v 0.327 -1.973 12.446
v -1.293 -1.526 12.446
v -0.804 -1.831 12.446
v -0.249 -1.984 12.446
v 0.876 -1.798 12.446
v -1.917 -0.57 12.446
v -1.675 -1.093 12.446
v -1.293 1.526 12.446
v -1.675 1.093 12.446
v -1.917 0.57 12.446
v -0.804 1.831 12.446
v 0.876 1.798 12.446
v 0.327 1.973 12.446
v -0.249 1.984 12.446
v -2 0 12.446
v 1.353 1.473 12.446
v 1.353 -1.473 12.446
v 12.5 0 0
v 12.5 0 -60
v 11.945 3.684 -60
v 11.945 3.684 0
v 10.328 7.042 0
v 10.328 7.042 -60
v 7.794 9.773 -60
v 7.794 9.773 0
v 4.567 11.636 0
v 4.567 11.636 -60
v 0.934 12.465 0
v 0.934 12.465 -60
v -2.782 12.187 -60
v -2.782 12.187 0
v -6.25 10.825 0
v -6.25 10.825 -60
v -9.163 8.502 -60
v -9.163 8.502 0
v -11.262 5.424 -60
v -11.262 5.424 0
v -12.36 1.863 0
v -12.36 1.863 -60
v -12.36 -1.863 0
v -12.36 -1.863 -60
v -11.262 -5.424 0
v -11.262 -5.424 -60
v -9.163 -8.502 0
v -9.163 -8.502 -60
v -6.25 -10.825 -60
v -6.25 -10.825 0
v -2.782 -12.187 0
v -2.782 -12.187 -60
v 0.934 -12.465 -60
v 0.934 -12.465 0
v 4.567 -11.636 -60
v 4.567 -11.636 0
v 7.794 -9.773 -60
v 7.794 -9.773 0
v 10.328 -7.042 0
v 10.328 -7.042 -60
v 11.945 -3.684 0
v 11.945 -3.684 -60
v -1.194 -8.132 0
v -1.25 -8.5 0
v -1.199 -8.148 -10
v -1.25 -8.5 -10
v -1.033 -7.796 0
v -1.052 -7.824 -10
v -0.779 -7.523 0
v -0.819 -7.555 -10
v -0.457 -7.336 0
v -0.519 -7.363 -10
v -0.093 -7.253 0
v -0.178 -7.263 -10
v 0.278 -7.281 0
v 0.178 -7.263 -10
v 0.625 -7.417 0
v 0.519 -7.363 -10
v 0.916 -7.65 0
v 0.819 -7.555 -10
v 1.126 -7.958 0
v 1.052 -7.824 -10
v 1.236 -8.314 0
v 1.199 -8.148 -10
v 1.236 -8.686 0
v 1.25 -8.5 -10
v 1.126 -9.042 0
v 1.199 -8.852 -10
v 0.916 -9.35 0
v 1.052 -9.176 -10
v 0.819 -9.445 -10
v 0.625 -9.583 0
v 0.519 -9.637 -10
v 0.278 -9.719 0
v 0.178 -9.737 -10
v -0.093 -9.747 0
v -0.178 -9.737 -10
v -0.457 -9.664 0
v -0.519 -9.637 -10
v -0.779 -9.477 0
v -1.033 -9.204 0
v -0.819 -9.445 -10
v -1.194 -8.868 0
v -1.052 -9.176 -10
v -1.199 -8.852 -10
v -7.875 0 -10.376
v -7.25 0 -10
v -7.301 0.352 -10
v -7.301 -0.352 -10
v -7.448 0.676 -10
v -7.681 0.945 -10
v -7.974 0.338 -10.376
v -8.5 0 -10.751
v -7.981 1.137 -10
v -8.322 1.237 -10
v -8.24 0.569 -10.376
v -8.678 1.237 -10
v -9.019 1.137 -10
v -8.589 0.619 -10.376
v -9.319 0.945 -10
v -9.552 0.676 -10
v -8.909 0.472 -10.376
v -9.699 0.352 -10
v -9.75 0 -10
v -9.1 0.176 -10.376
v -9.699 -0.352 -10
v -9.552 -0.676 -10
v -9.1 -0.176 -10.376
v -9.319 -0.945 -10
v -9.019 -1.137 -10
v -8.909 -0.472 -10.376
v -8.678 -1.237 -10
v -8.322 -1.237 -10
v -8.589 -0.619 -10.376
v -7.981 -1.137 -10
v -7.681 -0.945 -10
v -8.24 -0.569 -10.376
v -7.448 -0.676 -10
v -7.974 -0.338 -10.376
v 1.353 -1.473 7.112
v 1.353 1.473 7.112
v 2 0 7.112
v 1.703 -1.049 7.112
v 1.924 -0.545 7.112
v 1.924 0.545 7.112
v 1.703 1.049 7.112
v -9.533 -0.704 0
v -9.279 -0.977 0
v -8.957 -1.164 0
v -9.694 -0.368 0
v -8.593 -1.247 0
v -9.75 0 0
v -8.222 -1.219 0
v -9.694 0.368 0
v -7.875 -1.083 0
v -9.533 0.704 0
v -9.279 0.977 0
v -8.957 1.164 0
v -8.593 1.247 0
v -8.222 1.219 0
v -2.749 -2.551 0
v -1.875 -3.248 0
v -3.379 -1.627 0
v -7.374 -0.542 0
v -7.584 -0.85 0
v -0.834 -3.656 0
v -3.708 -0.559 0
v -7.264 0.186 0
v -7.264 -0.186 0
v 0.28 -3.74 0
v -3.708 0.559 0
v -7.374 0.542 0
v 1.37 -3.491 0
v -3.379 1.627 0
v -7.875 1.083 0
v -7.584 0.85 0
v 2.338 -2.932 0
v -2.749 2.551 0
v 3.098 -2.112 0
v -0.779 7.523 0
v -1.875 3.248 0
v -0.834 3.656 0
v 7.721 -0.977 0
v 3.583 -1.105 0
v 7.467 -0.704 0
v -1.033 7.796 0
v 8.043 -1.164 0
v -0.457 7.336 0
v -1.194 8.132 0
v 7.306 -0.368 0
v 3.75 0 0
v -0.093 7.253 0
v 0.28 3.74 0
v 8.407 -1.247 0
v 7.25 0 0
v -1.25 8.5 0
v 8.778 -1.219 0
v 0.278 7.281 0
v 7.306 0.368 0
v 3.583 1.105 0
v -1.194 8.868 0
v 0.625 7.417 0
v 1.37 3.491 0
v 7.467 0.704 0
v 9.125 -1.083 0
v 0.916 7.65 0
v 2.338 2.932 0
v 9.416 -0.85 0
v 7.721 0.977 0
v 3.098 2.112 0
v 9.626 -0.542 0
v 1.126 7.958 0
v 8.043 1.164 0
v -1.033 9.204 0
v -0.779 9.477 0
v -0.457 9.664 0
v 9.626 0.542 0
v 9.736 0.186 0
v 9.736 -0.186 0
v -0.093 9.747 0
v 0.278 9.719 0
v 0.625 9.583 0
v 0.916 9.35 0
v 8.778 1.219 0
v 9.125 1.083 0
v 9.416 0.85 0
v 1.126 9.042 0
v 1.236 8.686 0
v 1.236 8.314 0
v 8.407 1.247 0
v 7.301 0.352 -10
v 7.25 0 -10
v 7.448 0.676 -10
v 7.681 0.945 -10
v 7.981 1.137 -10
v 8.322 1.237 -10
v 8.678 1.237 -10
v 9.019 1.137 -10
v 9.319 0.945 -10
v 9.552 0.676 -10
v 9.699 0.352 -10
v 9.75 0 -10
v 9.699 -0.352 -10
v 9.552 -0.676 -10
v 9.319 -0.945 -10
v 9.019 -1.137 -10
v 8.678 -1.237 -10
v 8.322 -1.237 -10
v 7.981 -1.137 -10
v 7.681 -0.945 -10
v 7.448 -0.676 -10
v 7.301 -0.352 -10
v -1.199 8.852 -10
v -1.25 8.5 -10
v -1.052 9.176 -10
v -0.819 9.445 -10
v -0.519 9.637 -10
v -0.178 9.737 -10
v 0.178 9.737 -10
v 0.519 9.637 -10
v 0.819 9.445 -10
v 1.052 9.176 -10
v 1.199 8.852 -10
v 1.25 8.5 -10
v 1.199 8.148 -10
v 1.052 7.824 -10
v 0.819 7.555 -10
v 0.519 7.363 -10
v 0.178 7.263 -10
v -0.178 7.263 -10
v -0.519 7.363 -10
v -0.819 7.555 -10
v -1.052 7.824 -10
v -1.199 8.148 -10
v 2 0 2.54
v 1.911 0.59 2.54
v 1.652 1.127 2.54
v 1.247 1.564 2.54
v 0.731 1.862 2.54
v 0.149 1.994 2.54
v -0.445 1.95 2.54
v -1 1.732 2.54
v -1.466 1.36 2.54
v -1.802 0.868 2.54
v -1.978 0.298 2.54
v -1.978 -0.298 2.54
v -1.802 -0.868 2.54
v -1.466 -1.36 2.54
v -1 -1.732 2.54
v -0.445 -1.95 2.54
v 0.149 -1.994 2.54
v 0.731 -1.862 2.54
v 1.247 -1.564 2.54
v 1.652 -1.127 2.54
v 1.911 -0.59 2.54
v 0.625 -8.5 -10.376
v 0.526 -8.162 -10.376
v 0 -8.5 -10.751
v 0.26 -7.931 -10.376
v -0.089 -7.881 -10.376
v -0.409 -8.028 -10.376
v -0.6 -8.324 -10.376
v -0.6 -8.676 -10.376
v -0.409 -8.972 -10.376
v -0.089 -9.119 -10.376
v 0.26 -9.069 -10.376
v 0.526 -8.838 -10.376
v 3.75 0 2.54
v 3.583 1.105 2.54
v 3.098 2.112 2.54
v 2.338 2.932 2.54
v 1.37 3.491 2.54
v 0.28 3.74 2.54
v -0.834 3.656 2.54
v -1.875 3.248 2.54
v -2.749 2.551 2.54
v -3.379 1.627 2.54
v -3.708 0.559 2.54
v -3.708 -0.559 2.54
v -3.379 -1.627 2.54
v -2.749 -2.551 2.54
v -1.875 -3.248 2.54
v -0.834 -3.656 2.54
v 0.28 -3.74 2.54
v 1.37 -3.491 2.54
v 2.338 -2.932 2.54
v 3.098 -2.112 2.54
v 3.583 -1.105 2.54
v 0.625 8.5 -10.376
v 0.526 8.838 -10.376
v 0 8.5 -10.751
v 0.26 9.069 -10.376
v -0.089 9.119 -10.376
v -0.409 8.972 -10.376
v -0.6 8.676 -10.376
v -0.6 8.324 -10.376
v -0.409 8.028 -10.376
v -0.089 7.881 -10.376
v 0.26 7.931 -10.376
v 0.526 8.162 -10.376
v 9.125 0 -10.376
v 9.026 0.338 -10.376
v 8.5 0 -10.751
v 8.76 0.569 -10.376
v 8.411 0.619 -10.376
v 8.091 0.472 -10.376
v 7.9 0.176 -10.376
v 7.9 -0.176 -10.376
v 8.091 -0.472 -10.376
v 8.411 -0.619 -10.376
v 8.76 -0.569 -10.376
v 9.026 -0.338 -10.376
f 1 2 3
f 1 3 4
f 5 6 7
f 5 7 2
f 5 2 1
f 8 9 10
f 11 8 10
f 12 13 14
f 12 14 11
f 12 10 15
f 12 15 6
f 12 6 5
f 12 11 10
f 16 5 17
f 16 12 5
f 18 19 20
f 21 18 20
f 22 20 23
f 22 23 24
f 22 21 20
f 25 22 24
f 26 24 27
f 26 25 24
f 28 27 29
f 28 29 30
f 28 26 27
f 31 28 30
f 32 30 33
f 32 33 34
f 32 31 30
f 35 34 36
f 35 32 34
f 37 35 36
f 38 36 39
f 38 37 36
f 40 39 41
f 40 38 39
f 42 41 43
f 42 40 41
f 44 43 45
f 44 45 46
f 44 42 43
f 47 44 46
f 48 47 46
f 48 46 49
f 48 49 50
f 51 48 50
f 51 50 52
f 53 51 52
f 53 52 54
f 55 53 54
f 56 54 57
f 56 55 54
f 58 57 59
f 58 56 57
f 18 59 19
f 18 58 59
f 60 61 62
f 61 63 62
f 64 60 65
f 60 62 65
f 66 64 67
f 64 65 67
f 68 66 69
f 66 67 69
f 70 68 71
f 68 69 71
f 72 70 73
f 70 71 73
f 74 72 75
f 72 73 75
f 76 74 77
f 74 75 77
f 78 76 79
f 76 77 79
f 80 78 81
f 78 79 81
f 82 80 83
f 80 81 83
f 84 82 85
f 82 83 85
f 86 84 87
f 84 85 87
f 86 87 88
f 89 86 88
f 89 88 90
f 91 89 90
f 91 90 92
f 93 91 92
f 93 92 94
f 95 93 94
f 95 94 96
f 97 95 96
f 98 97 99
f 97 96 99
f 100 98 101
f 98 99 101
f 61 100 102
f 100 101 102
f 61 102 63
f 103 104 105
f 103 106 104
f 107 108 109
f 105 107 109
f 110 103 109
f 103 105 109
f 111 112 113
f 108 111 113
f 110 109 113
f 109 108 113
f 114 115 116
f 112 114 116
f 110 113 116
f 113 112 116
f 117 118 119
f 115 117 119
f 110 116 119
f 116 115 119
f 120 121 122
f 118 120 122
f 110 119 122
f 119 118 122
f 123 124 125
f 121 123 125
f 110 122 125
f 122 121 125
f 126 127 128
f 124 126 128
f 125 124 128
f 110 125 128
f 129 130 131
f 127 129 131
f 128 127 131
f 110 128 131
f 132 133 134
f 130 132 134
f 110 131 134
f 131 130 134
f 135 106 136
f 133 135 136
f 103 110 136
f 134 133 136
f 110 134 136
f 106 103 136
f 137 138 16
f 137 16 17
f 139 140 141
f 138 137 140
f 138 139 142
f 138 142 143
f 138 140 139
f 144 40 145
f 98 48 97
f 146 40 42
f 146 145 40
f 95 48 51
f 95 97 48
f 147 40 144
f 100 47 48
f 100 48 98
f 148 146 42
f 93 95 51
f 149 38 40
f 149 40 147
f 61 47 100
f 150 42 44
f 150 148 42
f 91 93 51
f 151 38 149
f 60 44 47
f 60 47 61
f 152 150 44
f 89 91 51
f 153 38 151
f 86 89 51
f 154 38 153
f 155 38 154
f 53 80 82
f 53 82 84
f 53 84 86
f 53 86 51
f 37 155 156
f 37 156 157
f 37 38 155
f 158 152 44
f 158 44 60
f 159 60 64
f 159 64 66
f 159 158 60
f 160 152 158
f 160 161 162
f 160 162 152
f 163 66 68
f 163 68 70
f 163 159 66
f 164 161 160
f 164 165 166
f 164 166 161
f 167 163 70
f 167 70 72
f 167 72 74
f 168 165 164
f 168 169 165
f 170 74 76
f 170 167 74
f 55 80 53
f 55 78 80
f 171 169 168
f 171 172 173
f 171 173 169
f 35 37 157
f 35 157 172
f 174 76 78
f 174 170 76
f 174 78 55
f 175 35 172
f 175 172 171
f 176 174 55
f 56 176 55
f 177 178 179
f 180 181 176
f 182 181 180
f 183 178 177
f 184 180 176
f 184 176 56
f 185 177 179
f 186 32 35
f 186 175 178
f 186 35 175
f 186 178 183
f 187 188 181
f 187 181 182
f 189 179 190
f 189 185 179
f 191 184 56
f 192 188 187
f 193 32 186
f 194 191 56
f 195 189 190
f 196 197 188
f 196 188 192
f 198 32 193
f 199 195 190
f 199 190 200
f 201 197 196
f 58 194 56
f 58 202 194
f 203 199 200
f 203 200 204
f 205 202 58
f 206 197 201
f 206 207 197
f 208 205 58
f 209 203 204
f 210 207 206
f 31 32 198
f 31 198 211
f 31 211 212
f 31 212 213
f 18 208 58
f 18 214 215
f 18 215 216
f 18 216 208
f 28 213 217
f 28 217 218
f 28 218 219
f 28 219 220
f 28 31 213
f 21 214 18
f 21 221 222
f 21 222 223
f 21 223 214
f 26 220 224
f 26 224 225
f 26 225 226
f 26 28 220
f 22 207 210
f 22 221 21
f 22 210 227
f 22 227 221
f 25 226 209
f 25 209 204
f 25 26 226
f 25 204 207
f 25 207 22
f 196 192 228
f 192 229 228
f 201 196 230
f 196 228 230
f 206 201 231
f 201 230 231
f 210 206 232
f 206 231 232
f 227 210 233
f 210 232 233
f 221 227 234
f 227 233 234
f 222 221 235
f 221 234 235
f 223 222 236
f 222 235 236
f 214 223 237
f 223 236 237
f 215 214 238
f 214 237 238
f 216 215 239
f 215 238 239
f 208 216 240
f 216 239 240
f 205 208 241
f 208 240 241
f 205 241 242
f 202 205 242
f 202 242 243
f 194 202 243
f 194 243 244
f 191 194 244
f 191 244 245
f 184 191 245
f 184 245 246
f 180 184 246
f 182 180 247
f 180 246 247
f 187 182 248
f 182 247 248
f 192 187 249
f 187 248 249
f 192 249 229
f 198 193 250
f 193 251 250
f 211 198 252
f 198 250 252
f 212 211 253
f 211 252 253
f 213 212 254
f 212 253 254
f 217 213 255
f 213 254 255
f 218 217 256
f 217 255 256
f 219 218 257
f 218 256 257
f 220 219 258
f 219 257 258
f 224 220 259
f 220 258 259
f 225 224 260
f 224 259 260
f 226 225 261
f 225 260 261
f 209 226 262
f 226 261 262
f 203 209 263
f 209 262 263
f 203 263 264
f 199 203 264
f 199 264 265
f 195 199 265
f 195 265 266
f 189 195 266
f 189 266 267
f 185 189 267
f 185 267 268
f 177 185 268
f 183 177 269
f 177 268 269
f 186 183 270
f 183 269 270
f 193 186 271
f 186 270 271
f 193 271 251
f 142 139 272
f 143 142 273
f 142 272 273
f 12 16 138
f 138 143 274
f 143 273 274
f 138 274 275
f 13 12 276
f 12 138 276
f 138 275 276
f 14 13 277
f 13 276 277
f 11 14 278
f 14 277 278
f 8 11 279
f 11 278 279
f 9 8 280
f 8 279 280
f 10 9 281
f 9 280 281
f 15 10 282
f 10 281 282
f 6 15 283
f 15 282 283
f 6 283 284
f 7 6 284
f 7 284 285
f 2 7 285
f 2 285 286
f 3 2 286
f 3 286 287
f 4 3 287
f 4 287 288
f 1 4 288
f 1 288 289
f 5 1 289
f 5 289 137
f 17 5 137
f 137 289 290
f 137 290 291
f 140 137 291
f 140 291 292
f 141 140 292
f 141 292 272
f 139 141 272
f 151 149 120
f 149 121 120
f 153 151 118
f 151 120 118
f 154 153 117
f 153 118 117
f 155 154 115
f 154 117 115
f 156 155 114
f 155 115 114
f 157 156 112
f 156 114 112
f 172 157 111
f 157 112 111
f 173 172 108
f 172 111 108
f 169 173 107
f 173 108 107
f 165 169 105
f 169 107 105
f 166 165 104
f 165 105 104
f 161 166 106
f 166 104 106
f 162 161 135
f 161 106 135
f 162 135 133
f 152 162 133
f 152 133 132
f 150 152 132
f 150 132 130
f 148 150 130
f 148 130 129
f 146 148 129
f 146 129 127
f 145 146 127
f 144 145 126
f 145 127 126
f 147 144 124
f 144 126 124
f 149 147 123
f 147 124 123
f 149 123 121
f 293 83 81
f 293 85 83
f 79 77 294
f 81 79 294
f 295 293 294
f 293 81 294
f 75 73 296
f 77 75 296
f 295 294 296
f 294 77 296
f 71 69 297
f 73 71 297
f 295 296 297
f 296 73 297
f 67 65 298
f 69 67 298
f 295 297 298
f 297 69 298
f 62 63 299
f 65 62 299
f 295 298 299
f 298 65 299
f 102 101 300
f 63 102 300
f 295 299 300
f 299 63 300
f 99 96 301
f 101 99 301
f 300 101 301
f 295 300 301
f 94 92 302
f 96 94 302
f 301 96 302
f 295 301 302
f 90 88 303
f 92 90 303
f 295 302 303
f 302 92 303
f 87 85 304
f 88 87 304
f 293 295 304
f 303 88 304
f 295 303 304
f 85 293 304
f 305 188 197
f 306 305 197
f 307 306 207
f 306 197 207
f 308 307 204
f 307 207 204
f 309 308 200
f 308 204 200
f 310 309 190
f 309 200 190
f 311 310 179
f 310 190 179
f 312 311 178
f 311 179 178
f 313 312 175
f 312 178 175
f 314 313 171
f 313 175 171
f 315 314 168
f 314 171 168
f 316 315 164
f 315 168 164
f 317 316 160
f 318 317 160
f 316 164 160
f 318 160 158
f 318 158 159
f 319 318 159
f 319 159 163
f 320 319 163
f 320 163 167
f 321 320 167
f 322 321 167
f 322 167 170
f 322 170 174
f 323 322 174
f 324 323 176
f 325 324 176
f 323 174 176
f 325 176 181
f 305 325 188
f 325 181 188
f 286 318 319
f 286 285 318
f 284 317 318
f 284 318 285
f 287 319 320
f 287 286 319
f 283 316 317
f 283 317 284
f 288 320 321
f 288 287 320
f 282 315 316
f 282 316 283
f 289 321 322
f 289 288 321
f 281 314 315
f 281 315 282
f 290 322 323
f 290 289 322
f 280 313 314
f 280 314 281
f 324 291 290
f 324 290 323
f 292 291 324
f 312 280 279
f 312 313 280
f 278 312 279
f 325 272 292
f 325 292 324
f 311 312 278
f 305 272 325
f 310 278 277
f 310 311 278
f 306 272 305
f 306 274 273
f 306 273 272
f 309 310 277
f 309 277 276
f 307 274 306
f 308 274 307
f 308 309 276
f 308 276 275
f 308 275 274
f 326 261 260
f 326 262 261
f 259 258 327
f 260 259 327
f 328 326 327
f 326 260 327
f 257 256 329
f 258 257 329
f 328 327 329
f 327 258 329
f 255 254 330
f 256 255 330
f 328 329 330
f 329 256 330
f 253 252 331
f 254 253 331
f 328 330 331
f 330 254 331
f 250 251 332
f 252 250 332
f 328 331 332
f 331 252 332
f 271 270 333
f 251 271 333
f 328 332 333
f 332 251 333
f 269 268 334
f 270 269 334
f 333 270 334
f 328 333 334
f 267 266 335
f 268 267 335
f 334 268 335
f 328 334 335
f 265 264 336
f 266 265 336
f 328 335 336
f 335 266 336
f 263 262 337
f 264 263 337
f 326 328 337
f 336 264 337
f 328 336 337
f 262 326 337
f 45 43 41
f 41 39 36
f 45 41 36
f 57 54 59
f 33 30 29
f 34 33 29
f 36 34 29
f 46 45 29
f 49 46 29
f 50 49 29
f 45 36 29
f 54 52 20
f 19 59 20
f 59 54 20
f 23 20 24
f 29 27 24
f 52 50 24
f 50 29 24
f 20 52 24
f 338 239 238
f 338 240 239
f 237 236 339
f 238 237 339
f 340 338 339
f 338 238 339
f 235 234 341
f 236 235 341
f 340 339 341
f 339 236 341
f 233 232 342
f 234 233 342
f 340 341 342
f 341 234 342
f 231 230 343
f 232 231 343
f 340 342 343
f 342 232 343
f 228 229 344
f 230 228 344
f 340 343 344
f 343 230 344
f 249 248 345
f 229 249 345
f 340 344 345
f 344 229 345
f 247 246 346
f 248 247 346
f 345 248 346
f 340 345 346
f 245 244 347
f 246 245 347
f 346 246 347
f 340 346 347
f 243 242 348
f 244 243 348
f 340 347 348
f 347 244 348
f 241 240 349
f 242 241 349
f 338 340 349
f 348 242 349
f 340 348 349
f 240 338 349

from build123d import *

# Parameters (mm, degrees)
SKETCH1_R                       = 12.5
BOSS_EXTRUDE1_DEPTH             = 60
SKETCH4_R                       = 2
BOSS_EXTRUDE3_DEPTH             = 12.446
SKETCH5_R                       = 3.75
BOSS_EXTRUDE4_DEPTH             = 2.54
CUT_EXTRUDE2_START              = -5.334
CUT_EXTRUDE2_DEPTH              = 5.334
TAP_DRILL_FOR_M3X0_5_TAP1_D     = 2.5
TAP_DRILL_FOR_M3X0_5_TAP1_DEPTH = 10.0000054
TAP_DRILL_FOR_M3X0_5_TAP1_TIP   = 0.751075774


with BuildPart() as part:
    # Sketch1 → Boss-Extrude1 (new body)
    with BuildSketch(Plane.XY):
        Circle(SKETCH1_R)
    extrude(amount=-BOSS_EXTRUDE1_DEPTH)

    # Sketch4 → Boss-Extrude3 (add)
    with BuildSketch(Plane.XY):
        Circle(SKETCH4_R)
    extrude(amount=BOSS_EXTRUDE3_DEPTH)

    # Sketch5 → Boss-Extrude4 (add)
    with BuildSketch(Plane.XY):
        Circle(SKETCH5_R)
    extrude(amount=BOSS_EXTRUDE4_DEPTH)

    # Sketch6 → Cut-Extrude2 (cut)
    with BuildSketch(Plane.XY.offset(12.446).offset(CUT_EXTRUDE2_START)):
        with BuildLine():
            Line((1.35278764, 1.473080311), (1.35278764, -1.473080311))
            ThreePointArc((1.35278764, -1.473080311), (2, 0), (1.35278764, 1.473080311))
        make_face()
    extrude(amount=CUT_EXTRUDE2_DEPTH, mode=Mode.SUBTRACT)

    # Tap Drill for M3x0.5 Tap1
    with Locations(Plane.XY):
        with Locations((0, 8.5), (8.5, 0), (0, -8.5), (-8.5, 0)):
            Hole(TAP_DRILL_FOR_M3X0_5_TAP1_D / 2, depth=TAP_DRILL_FOR_M3X0_5_TAP1_DEPTH)
            with Locations((0, 0, -(TAP_DRILL_FOR_M3X0_5_TAP1_DEPTH + TAP_DRILL_FOR_M3X0_5_TAP1_TIP / 2))):  # 118° drill point
                Cone(0, TAP_DRILL_FOR_M3X0_5_TAP1_D / 2, TAP_DRILL_FOR_M3X0_5_TAP1_TIP, mode=Mode.SUBTRACT)


solid = part.part
